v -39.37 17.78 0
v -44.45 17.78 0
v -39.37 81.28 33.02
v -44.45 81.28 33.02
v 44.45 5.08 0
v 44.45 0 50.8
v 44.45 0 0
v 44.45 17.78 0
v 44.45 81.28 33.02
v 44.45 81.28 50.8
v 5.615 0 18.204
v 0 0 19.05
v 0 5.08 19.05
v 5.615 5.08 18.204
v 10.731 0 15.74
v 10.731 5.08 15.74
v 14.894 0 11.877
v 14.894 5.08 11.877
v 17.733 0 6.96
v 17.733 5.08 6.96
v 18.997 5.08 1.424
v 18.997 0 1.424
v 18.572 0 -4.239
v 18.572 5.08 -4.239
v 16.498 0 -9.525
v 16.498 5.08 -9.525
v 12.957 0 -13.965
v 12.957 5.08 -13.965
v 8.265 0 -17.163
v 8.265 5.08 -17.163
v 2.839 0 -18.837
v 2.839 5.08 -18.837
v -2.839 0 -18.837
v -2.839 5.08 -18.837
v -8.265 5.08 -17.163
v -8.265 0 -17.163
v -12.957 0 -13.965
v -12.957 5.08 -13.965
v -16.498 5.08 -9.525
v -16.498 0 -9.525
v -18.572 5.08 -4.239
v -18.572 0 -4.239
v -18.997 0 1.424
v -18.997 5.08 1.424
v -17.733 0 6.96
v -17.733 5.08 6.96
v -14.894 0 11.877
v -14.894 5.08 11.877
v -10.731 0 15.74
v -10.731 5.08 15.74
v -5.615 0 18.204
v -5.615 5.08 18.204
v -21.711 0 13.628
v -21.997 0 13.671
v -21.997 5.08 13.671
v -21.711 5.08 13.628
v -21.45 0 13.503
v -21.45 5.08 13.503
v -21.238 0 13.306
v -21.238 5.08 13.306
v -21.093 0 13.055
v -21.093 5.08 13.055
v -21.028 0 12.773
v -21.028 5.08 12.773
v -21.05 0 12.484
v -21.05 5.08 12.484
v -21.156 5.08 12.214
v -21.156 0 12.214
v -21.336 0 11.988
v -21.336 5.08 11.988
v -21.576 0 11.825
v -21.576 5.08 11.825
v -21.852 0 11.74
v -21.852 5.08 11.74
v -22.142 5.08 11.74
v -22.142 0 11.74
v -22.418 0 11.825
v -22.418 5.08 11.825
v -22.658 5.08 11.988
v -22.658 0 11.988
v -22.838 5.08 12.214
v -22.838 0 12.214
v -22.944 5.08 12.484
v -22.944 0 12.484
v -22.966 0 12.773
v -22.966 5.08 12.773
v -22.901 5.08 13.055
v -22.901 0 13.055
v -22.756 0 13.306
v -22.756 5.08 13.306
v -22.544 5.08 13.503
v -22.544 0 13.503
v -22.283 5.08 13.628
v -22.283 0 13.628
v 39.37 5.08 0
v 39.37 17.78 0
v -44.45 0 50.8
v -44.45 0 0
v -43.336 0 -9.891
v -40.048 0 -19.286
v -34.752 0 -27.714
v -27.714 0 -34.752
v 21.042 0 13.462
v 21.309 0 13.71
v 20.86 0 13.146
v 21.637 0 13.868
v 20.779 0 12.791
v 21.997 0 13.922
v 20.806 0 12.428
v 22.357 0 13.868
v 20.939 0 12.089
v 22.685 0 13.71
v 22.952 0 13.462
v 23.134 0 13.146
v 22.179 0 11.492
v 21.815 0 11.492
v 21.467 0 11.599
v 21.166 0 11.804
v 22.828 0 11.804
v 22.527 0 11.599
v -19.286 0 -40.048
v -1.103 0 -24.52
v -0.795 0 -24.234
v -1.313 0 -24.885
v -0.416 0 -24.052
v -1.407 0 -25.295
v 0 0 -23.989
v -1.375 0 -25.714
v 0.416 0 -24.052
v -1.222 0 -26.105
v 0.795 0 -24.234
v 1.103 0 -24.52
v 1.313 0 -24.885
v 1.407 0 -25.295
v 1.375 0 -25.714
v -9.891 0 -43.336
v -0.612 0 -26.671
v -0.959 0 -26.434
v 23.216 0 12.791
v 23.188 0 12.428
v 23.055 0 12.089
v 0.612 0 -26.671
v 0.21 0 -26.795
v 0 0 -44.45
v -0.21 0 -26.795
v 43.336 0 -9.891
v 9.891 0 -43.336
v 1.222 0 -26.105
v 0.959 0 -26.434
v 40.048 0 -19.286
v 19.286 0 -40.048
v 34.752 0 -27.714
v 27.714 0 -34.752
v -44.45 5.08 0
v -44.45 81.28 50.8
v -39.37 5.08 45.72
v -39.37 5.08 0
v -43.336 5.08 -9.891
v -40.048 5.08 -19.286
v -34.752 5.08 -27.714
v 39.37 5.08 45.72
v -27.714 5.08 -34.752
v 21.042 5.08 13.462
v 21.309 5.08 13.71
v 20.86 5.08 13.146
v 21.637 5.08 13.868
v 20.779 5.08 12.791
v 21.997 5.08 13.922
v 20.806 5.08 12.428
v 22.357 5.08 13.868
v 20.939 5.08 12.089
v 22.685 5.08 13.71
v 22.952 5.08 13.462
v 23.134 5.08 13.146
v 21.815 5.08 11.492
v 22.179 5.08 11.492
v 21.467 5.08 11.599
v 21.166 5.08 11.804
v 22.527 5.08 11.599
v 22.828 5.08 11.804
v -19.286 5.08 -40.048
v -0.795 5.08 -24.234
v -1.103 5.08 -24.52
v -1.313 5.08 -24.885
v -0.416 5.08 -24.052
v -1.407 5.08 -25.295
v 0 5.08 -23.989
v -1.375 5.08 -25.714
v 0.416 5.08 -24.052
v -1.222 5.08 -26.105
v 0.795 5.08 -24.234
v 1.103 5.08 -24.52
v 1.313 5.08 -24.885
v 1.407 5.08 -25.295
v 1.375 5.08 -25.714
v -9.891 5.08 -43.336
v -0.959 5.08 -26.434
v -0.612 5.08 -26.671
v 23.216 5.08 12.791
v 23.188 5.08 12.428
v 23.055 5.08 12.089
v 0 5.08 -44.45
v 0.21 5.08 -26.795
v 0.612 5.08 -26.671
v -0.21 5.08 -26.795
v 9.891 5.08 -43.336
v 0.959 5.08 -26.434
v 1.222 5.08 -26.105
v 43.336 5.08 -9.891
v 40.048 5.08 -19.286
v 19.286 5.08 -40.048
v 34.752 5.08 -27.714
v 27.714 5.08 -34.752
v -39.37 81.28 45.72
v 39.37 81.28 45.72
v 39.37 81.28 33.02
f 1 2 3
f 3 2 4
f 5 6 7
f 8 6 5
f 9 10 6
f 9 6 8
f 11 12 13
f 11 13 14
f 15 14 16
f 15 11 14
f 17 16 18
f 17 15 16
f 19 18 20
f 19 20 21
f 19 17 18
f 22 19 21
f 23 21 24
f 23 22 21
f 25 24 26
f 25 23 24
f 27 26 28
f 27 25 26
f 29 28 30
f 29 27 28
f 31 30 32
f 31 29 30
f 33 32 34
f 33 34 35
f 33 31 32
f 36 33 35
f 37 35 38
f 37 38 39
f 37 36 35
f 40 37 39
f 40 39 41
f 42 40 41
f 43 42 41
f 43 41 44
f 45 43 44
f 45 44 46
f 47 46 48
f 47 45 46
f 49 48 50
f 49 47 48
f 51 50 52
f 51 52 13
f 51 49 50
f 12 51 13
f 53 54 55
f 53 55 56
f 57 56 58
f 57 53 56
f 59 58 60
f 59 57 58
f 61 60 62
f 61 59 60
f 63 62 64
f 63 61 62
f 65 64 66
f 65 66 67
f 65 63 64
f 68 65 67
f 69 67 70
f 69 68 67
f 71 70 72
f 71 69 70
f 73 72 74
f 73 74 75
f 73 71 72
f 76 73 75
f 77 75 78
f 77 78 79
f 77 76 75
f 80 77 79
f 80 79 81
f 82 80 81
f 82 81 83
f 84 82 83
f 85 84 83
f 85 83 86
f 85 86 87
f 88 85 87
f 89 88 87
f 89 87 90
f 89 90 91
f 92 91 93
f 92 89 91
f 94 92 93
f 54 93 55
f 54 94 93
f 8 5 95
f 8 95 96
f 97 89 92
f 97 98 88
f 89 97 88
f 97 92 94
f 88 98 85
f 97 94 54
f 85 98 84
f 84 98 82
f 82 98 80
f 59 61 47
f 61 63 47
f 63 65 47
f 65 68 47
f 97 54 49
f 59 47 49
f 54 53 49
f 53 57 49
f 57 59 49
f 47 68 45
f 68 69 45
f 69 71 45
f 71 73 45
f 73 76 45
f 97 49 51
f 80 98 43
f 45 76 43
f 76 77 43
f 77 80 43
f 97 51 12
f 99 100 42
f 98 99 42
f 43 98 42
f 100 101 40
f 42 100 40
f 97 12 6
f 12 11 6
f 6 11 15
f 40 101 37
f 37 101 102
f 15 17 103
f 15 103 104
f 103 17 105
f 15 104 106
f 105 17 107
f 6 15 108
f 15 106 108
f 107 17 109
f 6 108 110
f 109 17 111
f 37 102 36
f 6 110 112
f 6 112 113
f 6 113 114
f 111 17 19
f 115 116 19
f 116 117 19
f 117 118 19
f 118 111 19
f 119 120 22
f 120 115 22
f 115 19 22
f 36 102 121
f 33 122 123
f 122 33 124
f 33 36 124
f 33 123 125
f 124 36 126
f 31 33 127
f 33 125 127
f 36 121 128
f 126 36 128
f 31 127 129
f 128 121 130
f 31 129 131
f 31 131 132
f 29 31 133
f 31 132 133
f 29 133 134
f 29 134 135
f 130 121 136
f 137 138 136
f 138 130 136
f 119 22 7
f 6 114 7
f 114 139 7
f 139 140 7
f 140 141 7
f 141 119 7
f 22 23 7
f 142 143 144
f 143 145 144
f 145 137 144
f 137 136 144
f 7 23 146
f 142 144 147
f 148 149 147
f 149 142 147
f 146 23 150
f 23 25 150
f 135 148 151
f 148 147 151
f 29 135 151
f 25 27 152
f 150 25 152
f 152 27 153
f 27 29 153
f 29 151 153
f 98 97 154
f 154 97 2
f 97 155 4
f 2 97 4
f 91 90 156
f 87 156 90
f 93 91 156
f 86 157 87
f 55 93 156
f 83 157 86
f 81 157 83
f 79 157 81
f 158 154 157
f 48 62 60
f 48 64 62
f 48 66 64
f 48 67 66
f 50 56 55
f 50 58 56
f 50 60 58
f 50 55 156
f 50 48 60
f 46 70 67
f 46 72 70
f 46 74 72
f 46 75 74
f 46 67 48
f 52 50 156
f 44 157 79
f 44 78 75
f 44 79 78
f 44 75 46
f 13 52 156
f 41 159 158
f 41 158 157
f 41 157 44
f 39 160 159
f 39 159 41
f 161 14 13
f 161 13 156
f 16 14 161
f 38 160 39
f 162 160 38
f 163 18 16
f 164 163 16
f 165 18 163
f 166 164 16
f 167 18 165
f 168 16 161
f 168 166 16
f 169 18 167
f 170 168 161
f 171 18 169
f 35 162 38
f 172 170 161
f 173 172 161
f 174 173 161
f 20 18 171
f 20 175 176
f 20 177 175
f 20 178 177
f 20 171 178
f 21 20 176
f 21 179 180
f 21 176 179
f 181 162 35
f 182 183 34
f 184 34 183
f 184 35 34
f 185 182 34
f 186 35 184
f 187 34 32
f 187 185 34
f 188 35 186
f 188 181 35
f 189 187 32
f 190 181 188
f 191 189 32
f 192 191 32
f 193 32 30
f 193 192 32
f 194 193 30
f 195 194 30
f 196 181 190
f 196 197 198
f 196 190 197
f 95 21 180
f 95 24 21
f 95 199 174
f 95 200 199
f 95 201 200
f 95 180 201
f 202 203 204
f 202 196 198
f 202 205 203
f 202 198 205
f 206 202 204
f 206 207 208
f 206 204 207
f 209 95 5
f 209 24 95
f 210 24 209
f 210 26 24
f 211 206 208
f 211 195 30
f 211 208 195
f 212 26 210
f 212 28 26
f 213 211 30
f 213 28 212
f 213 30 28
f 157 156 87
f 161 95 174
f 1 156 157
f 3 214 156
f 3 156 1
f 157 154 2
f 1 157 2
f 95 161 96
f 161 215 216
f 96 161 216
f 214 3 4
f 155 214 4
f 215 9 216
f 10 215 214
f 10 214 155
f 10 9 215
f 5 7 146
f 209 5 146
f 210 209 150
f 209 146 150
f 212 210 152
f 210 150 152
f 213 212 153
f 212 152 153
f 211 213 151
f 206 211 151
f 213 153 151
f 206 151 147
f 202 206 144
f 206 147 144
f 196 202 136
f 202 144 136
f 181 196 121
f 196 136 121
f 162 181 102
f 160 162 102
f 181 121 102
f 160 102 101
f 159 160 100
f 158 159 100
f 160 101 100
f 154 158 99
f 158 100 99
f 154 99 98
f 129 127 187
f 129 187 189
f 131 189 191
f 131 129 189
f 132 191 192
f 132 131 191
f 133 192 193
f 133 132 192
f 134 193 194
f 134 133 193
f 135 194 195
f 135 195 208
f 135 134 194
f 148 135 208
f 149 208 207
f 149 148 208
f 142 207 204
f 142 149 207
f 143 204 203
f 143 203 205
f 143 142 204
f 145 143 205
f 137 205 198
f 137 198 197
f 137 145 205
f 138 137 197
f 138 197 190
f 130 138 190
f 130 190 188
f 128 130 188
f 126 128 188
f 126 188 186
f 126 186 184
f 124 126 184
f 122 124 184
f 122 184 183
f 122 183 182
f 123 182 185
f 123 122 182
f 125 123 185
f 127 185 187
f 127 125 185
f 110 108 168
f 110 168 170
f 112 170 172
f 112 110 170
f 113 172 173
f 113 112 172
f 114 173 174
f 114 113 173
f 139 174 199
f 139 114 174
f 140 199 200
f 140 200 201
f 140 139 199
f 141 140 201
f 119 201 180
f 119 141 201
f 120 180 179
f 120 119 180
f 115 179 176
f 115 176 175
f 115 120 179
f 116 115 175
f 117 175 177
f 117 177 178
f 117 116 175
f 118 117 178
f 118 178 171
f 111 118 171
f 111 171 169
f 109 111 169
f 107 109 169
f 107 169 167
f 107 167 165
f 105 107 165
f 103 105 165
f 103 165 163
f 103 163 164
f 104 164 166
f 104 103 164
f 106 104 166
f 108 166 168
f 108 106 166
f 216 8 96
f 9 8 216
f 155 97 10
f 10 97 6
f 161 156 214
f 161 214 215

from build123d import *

# Parameters (mm, degrees)
SKETCH1_R           = 44.45
SKETCH1_R_2         = 19.05
SKETCH1_R_3         = 1.410622882
SKETCH1_R_4         = 1.22190068
SKETCH1_R_5         = 0.971343814
BOSS_EXTRUDE1_DEPTH = 5.08
BOSS_EXTRUDE2_DEPTH = 5.08
SKETCH3_W           = 88.9
SKETCH3_H           = 5.08
EXTRUDE_THIN1_DEPTH = 76.2
BOSS_EXTRUDE3_DEPTH = 5.08


with BuildPart() as part:
    # Sketch1 → Boss-Extrude1 (new body)
    with BuildSketch(Plane(origin=(0, 0, 0), x_dir=(1, 0, 0), z_dir=(0, 1, 0))):
        with Locations(Location((0, 0, 0), (0, 0, 270))):
            Circle(SKETCH1_R)
        with Locations(Location((0, 0, 0), (0, 0, 270))):
            Circle(SKETCH1_R_2, mode=Mode.SUBTRACT)
        with Locations(Location((0, 25.4, 0), (0, 0, 270))):
            Circle(SKETCH1_R_3, mode=Mode.SUBTRACT)
        with Locations(Location((21.997045256, -12.7, 0), (0, 0, 270))):
            Circle(SKETCH1_R_4, mode=Mode.SUBTRACT)
        with Locations(Location((-21.997045256, -12.7, 0), (0, 0, 270))):
            Circle(SKETCH1_R_5, mode=Mode.SUBTRACT)
    extrude(amount=BOSS_EXTRUDE1_DEPTH)

    # Sketch2 → Boss-Extrude2 (add)
    with BuildSketch(Plane(origin=(0, 0, 0), x_dir=(1, 0, 0), z_dir=(0, 1, 0))):
        with BuildLine():
            Line((-44.45, 0), (-44.45, -50.8))
            Line((-44.45, -50.8), (44.45, -50.8))
            Line((44.45, -50.8), (44.45, 0))
            ThreePointArc((44.45, 0), (0, -44.45), (-44.45, 0))
        make_face()
    extrude(amount=BOSS_EXTRUDE2_DEPTH)

    # Sketch3 → Extrude-Thin1 (add)
    with BuildSketch(Plane(origin=(0, 5.08, 0), x_dir=(1, 0, 0), z_dir=(0, 1, 0))):
        with Locations((0, -48.26)):
            Rectangle(SKETCH3_W, SKETCH3_H)
    extrude(amount=EXTRUDE_THIN1_DEPTH)

    # Sketch4 → Boss-Extrude3 (add)
    with BuildSketch(Plane.ZY.offset(44.45)):
        Polygon((0, 5.08), (0, 17.78), (33.02, 81.28), (45.72, 81.28), (45.72, 5.08), align=None)
    boss_extrude3 = extrude(amount=-BOSS_EXTRUDE3_DEPTH)

    # Mirror1: Boss-Extrude3 across plane
    add(boss_extrude3.mirror(Plane(origin=(0, 0, 0), x_dir=(0, 0, 1), z_dir=(1, 0, 0))))


solid = part.part
